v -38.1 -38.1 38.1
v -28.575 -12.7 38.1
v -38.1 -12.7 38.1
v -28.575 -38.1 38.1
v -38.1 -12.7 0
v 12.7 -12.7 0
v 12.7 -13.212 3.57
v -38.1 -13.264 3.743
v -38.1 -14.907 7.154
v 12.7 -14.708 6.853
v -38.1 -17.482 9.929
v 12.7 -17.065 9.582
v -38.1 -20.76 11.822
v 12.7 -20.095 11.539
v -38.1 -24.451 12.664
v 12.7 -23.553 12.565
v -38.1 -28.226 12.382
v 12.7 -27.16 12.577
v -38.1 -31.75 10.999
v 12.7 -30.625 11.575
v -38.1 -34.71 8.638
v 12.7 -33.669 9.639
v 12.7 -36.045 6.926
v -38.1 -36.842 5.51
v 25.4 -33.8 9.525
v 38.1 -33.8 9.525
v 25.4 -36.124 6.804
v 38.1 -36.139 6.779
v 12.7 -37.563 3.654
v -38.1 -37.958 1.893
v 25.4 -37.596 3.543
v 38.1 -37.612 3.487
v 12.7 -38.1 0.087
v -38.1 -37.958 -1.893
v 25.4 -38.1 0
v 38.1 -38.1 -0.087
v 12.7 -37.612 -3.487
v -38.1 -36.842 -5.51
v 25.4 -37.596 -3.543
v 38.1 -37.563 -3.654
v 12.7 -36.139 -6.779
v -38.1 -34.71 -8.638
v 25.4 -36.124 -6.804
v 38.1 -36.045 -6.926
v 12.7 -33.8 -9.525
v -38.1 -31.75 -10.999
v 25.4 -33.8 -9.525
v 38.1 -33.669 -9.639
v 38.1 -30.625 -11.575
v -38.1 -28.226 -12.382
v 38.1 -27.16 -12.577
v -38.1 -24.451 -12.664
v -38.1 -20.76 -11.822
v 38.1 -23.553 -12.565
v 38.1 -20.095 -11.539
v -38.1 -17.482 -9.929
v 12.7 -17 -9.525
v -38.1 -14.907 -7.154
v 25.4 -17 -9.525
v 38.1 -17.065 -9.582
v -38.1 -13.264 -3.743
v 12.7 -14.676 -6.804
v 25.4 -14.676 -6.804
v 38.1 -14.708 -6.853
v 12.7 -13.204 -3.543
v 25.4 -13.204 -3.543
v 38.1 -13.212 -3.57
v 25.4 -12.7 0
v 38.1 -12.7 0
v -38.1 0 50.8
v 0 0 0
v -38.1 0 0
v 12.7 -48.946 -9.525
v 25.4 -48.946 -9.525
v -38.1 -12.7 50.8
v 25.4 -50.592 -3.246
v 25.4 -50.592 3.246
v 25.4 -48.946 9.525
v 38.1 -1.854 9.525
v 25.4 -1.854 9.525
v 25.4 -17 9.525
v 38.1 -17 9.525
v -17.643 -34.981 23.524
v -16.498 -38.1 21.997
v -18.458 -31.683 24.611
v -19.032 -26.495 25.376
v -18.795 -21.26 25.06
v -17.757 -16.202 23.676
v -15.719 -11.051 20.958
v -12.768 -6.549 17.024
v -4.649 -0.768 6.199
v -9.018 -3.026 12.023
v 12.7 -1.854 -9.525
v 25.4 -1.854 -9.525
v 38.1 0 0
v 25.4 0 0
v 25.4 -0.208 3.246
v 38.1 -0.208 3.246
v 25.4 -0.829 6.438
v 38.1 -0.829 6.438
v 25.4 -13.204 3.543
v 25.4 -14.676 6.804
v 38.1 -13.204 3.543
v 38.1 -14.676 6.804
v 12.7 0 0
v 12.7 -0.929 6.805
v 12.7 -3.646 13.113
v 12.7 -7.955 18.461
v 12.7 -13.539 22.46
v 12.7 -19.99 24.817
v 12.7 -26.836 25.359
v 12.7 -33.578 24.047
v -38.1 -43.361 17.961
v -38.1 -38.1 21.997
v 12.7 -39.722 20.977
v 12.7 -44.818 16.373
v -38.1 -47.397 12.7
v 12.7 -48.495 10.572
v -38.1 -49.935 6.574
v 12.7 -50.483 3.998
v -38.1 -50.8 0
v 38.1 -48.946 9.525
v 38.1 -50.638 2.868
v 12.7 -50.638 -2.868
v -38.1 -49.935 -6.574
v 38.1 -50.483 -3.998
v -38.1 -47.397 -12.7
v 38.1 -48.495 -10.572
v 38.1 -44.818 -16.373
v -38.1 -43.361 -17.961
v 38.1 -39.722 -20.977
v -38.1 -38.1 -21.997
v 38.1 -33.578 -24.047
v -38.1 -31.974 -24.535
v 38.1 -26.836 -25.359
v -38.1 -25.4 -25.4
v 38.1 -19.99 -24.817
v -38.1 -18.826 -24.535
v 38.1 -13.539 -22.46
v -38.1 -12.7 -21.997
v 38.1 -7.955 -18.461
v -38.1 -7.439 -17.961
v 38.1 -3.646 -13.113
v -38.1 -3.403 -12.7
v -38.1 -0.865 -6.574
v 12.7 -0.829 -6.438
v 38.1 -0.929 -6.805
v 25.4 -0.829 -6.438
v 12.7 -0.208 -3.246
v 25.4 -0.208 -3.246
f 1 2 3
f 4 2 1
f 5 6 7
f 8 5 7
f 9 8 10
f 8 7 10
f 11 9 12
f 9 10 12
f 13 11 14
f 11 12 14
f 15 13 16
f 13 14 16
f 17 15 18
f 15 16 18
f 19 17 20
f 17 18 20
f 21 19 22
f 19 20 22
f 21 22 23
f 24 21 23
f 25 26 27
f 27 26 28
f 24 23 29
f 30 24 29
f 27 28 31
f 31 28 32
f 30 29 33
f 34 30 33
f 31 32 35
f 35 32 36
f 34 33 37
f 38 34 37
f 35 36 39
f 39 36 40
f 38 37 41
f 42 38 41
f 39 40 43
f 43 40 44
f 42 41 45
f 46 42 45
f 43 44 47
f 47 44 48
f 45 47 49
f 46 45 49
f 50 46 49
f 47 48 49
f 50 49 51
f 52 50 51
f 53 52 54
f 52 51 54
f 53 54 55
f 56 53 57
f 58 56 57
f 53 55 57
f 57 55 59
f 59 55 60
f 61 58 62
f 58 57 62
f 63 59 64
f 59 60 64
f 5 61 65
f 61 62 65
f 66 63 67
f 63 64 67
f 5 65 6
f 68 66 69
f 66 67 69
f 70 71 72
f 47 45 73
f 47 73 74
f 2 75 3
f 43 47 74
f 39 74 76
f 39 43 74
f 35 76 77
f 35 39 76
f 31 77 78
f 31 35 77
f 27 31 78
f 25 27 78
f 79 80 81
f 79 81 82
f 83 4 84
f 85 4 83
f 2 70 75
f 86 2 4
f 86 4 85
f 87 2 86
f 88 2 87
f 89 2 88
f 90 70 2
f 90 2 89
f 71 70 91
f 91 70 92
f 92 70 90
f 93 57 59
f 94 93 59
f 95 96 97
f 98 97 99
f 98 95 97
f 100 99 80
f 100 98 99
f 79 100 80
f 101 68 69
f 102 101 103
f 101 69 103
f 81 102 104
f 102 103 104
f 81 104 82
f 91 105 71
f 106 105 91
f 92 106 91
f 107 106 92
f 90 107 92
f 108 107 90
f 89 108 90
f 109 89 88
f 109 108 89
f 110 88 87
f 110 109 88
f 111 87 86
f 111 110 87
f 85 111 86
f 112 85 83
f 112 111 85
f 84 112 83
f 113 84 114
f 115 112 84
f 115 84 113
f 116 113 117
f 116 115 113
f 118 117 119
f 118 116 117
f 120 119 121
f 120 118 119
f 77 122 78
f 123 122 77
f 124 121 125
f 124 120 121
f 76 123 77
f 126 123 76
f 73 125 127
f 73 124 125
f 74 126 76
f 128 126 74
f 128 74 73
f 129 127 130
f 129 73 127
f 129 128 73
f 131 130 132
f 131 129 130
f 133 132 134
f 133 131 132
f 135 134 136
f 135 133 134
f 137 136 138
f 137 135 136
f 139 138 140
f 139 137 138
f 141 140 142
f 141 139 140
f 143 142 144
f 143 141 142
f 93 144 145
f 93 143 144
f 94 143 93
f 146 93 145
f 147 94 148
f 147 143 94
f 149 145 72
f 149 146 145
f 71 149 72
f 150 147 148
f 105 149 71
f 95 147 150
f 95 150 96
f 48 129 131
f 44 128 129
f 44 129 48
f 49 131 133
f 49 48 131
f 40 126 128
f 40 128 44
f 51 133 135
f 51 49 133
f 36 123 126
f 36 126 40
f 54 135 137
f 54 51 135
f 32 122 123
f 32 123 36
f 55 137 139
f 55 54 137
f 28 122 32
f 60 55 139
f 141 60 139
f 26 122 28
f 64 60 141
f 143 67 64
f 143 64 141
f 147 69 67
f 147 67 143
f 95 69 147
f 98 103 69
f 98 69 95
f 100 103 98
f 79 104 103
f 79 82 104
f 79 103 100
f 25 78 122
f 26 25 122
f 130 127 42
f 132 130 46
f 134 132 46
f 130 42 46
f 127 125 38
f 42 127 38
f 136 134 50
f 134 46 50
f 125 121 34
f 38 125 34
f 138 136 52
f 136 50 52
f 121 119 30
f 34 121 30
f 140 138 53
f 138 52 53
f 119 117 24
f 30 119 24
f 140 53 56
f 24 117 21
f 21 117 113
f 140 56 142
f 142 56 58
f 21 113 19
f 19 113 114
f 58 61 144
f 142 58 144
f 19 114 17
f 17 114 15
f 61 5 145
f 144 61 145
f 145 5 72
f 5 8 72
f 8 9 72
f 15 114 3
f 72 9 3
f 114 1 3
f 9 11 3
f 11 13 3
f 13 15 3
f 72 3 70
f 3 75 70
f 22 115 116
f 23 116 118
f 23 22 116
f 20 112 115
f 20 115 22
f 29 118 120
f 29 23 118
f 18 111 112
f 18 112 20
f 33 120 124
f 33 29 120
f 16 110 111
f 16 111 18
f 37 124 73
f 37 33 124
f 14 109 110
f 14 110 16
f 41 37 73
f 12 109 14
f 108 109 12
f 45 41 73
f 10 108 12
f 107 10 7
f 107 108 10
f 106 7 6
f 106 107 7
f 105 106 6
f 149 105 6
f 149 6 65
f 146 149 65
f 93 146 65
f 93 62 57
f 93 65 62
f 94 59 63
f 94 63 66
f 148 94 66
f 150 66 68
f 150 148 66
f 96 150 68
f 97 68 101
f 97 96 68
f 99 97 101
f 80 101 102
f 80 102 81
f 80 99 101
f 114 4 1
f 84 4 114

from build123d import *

# Parameters (mm, degrees)
F1_DEPTH  = 38.1
F3_DEPTH  = 38.101
F5_R      = 25.4
F6_DEPTH  = 50.8
F6_FACE_R = 25.4
F7_DEPTH  = 25.4
F8_R      = 12.7
F9_DEPTH  = 76.201
F11_DEPTH = 50.801


with BuildPart() as f1:
    # F0 (on Right) → F1 (new body)
    with BuildSketch(Plane.YZ):
        Polygon((-38.1, 0), (0, 0), (0, 50.8), (-12.7, 50.8), (-12.7, 38.1), (-38.1, 38.1), align=None)
    extrude(amount=-F1_DEPTH)

    # F2 (on Front) → F3 (cut, through all)
    with BuildSketch(Plane.XZ):
        Polygon((-38.1, 50.8), (0, 0), (0, 50.8), align=None)
    extrude(amount=F3_DEPTH, mode=Mode.SUBTRACT)

    # F5 (on offset) → F6 (join)
    with BuildSketch(Plane.YZ.offset(12.7)):
        with Locations((-25.4, 0)):
            Circle(F5_R)
    extrude(amount=-F6_DEPTH)

    # F6_face (on face) → F7 (join)
    with BuildSketch(Plane(origin=(12.7, -25.4, 0), x_dir=(0, 1, 0), z_dir=(1, 0, 0))):
        Circle(F6_FACE_R)
    extrude(amount=F7_DEPTH)

    # F8 (on face) → F9 (cut, through all)
    with BuildSketch(Plane.YZ.offset(38.1)):
        with Locations((-25.4, 0)):
            Circle(F8_R)
    extrude(amount=-F9_DEPTH, mode=Mode.SUBTRACT)

    # F10 (on Front) → F11 (cut, through all)
    with BuildSketch(Plane.XZ):
        Polygon((38.1, 9.525), (38.1, 25.4), (12.7, 25.4), (12.7, 0), (12.7, -9.525), (25.4, -9.525), (25.4, 9.525), align=None)
    extrude(amount=F11_DEPTH, mode=Mode.SUBTRACT)


solid = f1.part
